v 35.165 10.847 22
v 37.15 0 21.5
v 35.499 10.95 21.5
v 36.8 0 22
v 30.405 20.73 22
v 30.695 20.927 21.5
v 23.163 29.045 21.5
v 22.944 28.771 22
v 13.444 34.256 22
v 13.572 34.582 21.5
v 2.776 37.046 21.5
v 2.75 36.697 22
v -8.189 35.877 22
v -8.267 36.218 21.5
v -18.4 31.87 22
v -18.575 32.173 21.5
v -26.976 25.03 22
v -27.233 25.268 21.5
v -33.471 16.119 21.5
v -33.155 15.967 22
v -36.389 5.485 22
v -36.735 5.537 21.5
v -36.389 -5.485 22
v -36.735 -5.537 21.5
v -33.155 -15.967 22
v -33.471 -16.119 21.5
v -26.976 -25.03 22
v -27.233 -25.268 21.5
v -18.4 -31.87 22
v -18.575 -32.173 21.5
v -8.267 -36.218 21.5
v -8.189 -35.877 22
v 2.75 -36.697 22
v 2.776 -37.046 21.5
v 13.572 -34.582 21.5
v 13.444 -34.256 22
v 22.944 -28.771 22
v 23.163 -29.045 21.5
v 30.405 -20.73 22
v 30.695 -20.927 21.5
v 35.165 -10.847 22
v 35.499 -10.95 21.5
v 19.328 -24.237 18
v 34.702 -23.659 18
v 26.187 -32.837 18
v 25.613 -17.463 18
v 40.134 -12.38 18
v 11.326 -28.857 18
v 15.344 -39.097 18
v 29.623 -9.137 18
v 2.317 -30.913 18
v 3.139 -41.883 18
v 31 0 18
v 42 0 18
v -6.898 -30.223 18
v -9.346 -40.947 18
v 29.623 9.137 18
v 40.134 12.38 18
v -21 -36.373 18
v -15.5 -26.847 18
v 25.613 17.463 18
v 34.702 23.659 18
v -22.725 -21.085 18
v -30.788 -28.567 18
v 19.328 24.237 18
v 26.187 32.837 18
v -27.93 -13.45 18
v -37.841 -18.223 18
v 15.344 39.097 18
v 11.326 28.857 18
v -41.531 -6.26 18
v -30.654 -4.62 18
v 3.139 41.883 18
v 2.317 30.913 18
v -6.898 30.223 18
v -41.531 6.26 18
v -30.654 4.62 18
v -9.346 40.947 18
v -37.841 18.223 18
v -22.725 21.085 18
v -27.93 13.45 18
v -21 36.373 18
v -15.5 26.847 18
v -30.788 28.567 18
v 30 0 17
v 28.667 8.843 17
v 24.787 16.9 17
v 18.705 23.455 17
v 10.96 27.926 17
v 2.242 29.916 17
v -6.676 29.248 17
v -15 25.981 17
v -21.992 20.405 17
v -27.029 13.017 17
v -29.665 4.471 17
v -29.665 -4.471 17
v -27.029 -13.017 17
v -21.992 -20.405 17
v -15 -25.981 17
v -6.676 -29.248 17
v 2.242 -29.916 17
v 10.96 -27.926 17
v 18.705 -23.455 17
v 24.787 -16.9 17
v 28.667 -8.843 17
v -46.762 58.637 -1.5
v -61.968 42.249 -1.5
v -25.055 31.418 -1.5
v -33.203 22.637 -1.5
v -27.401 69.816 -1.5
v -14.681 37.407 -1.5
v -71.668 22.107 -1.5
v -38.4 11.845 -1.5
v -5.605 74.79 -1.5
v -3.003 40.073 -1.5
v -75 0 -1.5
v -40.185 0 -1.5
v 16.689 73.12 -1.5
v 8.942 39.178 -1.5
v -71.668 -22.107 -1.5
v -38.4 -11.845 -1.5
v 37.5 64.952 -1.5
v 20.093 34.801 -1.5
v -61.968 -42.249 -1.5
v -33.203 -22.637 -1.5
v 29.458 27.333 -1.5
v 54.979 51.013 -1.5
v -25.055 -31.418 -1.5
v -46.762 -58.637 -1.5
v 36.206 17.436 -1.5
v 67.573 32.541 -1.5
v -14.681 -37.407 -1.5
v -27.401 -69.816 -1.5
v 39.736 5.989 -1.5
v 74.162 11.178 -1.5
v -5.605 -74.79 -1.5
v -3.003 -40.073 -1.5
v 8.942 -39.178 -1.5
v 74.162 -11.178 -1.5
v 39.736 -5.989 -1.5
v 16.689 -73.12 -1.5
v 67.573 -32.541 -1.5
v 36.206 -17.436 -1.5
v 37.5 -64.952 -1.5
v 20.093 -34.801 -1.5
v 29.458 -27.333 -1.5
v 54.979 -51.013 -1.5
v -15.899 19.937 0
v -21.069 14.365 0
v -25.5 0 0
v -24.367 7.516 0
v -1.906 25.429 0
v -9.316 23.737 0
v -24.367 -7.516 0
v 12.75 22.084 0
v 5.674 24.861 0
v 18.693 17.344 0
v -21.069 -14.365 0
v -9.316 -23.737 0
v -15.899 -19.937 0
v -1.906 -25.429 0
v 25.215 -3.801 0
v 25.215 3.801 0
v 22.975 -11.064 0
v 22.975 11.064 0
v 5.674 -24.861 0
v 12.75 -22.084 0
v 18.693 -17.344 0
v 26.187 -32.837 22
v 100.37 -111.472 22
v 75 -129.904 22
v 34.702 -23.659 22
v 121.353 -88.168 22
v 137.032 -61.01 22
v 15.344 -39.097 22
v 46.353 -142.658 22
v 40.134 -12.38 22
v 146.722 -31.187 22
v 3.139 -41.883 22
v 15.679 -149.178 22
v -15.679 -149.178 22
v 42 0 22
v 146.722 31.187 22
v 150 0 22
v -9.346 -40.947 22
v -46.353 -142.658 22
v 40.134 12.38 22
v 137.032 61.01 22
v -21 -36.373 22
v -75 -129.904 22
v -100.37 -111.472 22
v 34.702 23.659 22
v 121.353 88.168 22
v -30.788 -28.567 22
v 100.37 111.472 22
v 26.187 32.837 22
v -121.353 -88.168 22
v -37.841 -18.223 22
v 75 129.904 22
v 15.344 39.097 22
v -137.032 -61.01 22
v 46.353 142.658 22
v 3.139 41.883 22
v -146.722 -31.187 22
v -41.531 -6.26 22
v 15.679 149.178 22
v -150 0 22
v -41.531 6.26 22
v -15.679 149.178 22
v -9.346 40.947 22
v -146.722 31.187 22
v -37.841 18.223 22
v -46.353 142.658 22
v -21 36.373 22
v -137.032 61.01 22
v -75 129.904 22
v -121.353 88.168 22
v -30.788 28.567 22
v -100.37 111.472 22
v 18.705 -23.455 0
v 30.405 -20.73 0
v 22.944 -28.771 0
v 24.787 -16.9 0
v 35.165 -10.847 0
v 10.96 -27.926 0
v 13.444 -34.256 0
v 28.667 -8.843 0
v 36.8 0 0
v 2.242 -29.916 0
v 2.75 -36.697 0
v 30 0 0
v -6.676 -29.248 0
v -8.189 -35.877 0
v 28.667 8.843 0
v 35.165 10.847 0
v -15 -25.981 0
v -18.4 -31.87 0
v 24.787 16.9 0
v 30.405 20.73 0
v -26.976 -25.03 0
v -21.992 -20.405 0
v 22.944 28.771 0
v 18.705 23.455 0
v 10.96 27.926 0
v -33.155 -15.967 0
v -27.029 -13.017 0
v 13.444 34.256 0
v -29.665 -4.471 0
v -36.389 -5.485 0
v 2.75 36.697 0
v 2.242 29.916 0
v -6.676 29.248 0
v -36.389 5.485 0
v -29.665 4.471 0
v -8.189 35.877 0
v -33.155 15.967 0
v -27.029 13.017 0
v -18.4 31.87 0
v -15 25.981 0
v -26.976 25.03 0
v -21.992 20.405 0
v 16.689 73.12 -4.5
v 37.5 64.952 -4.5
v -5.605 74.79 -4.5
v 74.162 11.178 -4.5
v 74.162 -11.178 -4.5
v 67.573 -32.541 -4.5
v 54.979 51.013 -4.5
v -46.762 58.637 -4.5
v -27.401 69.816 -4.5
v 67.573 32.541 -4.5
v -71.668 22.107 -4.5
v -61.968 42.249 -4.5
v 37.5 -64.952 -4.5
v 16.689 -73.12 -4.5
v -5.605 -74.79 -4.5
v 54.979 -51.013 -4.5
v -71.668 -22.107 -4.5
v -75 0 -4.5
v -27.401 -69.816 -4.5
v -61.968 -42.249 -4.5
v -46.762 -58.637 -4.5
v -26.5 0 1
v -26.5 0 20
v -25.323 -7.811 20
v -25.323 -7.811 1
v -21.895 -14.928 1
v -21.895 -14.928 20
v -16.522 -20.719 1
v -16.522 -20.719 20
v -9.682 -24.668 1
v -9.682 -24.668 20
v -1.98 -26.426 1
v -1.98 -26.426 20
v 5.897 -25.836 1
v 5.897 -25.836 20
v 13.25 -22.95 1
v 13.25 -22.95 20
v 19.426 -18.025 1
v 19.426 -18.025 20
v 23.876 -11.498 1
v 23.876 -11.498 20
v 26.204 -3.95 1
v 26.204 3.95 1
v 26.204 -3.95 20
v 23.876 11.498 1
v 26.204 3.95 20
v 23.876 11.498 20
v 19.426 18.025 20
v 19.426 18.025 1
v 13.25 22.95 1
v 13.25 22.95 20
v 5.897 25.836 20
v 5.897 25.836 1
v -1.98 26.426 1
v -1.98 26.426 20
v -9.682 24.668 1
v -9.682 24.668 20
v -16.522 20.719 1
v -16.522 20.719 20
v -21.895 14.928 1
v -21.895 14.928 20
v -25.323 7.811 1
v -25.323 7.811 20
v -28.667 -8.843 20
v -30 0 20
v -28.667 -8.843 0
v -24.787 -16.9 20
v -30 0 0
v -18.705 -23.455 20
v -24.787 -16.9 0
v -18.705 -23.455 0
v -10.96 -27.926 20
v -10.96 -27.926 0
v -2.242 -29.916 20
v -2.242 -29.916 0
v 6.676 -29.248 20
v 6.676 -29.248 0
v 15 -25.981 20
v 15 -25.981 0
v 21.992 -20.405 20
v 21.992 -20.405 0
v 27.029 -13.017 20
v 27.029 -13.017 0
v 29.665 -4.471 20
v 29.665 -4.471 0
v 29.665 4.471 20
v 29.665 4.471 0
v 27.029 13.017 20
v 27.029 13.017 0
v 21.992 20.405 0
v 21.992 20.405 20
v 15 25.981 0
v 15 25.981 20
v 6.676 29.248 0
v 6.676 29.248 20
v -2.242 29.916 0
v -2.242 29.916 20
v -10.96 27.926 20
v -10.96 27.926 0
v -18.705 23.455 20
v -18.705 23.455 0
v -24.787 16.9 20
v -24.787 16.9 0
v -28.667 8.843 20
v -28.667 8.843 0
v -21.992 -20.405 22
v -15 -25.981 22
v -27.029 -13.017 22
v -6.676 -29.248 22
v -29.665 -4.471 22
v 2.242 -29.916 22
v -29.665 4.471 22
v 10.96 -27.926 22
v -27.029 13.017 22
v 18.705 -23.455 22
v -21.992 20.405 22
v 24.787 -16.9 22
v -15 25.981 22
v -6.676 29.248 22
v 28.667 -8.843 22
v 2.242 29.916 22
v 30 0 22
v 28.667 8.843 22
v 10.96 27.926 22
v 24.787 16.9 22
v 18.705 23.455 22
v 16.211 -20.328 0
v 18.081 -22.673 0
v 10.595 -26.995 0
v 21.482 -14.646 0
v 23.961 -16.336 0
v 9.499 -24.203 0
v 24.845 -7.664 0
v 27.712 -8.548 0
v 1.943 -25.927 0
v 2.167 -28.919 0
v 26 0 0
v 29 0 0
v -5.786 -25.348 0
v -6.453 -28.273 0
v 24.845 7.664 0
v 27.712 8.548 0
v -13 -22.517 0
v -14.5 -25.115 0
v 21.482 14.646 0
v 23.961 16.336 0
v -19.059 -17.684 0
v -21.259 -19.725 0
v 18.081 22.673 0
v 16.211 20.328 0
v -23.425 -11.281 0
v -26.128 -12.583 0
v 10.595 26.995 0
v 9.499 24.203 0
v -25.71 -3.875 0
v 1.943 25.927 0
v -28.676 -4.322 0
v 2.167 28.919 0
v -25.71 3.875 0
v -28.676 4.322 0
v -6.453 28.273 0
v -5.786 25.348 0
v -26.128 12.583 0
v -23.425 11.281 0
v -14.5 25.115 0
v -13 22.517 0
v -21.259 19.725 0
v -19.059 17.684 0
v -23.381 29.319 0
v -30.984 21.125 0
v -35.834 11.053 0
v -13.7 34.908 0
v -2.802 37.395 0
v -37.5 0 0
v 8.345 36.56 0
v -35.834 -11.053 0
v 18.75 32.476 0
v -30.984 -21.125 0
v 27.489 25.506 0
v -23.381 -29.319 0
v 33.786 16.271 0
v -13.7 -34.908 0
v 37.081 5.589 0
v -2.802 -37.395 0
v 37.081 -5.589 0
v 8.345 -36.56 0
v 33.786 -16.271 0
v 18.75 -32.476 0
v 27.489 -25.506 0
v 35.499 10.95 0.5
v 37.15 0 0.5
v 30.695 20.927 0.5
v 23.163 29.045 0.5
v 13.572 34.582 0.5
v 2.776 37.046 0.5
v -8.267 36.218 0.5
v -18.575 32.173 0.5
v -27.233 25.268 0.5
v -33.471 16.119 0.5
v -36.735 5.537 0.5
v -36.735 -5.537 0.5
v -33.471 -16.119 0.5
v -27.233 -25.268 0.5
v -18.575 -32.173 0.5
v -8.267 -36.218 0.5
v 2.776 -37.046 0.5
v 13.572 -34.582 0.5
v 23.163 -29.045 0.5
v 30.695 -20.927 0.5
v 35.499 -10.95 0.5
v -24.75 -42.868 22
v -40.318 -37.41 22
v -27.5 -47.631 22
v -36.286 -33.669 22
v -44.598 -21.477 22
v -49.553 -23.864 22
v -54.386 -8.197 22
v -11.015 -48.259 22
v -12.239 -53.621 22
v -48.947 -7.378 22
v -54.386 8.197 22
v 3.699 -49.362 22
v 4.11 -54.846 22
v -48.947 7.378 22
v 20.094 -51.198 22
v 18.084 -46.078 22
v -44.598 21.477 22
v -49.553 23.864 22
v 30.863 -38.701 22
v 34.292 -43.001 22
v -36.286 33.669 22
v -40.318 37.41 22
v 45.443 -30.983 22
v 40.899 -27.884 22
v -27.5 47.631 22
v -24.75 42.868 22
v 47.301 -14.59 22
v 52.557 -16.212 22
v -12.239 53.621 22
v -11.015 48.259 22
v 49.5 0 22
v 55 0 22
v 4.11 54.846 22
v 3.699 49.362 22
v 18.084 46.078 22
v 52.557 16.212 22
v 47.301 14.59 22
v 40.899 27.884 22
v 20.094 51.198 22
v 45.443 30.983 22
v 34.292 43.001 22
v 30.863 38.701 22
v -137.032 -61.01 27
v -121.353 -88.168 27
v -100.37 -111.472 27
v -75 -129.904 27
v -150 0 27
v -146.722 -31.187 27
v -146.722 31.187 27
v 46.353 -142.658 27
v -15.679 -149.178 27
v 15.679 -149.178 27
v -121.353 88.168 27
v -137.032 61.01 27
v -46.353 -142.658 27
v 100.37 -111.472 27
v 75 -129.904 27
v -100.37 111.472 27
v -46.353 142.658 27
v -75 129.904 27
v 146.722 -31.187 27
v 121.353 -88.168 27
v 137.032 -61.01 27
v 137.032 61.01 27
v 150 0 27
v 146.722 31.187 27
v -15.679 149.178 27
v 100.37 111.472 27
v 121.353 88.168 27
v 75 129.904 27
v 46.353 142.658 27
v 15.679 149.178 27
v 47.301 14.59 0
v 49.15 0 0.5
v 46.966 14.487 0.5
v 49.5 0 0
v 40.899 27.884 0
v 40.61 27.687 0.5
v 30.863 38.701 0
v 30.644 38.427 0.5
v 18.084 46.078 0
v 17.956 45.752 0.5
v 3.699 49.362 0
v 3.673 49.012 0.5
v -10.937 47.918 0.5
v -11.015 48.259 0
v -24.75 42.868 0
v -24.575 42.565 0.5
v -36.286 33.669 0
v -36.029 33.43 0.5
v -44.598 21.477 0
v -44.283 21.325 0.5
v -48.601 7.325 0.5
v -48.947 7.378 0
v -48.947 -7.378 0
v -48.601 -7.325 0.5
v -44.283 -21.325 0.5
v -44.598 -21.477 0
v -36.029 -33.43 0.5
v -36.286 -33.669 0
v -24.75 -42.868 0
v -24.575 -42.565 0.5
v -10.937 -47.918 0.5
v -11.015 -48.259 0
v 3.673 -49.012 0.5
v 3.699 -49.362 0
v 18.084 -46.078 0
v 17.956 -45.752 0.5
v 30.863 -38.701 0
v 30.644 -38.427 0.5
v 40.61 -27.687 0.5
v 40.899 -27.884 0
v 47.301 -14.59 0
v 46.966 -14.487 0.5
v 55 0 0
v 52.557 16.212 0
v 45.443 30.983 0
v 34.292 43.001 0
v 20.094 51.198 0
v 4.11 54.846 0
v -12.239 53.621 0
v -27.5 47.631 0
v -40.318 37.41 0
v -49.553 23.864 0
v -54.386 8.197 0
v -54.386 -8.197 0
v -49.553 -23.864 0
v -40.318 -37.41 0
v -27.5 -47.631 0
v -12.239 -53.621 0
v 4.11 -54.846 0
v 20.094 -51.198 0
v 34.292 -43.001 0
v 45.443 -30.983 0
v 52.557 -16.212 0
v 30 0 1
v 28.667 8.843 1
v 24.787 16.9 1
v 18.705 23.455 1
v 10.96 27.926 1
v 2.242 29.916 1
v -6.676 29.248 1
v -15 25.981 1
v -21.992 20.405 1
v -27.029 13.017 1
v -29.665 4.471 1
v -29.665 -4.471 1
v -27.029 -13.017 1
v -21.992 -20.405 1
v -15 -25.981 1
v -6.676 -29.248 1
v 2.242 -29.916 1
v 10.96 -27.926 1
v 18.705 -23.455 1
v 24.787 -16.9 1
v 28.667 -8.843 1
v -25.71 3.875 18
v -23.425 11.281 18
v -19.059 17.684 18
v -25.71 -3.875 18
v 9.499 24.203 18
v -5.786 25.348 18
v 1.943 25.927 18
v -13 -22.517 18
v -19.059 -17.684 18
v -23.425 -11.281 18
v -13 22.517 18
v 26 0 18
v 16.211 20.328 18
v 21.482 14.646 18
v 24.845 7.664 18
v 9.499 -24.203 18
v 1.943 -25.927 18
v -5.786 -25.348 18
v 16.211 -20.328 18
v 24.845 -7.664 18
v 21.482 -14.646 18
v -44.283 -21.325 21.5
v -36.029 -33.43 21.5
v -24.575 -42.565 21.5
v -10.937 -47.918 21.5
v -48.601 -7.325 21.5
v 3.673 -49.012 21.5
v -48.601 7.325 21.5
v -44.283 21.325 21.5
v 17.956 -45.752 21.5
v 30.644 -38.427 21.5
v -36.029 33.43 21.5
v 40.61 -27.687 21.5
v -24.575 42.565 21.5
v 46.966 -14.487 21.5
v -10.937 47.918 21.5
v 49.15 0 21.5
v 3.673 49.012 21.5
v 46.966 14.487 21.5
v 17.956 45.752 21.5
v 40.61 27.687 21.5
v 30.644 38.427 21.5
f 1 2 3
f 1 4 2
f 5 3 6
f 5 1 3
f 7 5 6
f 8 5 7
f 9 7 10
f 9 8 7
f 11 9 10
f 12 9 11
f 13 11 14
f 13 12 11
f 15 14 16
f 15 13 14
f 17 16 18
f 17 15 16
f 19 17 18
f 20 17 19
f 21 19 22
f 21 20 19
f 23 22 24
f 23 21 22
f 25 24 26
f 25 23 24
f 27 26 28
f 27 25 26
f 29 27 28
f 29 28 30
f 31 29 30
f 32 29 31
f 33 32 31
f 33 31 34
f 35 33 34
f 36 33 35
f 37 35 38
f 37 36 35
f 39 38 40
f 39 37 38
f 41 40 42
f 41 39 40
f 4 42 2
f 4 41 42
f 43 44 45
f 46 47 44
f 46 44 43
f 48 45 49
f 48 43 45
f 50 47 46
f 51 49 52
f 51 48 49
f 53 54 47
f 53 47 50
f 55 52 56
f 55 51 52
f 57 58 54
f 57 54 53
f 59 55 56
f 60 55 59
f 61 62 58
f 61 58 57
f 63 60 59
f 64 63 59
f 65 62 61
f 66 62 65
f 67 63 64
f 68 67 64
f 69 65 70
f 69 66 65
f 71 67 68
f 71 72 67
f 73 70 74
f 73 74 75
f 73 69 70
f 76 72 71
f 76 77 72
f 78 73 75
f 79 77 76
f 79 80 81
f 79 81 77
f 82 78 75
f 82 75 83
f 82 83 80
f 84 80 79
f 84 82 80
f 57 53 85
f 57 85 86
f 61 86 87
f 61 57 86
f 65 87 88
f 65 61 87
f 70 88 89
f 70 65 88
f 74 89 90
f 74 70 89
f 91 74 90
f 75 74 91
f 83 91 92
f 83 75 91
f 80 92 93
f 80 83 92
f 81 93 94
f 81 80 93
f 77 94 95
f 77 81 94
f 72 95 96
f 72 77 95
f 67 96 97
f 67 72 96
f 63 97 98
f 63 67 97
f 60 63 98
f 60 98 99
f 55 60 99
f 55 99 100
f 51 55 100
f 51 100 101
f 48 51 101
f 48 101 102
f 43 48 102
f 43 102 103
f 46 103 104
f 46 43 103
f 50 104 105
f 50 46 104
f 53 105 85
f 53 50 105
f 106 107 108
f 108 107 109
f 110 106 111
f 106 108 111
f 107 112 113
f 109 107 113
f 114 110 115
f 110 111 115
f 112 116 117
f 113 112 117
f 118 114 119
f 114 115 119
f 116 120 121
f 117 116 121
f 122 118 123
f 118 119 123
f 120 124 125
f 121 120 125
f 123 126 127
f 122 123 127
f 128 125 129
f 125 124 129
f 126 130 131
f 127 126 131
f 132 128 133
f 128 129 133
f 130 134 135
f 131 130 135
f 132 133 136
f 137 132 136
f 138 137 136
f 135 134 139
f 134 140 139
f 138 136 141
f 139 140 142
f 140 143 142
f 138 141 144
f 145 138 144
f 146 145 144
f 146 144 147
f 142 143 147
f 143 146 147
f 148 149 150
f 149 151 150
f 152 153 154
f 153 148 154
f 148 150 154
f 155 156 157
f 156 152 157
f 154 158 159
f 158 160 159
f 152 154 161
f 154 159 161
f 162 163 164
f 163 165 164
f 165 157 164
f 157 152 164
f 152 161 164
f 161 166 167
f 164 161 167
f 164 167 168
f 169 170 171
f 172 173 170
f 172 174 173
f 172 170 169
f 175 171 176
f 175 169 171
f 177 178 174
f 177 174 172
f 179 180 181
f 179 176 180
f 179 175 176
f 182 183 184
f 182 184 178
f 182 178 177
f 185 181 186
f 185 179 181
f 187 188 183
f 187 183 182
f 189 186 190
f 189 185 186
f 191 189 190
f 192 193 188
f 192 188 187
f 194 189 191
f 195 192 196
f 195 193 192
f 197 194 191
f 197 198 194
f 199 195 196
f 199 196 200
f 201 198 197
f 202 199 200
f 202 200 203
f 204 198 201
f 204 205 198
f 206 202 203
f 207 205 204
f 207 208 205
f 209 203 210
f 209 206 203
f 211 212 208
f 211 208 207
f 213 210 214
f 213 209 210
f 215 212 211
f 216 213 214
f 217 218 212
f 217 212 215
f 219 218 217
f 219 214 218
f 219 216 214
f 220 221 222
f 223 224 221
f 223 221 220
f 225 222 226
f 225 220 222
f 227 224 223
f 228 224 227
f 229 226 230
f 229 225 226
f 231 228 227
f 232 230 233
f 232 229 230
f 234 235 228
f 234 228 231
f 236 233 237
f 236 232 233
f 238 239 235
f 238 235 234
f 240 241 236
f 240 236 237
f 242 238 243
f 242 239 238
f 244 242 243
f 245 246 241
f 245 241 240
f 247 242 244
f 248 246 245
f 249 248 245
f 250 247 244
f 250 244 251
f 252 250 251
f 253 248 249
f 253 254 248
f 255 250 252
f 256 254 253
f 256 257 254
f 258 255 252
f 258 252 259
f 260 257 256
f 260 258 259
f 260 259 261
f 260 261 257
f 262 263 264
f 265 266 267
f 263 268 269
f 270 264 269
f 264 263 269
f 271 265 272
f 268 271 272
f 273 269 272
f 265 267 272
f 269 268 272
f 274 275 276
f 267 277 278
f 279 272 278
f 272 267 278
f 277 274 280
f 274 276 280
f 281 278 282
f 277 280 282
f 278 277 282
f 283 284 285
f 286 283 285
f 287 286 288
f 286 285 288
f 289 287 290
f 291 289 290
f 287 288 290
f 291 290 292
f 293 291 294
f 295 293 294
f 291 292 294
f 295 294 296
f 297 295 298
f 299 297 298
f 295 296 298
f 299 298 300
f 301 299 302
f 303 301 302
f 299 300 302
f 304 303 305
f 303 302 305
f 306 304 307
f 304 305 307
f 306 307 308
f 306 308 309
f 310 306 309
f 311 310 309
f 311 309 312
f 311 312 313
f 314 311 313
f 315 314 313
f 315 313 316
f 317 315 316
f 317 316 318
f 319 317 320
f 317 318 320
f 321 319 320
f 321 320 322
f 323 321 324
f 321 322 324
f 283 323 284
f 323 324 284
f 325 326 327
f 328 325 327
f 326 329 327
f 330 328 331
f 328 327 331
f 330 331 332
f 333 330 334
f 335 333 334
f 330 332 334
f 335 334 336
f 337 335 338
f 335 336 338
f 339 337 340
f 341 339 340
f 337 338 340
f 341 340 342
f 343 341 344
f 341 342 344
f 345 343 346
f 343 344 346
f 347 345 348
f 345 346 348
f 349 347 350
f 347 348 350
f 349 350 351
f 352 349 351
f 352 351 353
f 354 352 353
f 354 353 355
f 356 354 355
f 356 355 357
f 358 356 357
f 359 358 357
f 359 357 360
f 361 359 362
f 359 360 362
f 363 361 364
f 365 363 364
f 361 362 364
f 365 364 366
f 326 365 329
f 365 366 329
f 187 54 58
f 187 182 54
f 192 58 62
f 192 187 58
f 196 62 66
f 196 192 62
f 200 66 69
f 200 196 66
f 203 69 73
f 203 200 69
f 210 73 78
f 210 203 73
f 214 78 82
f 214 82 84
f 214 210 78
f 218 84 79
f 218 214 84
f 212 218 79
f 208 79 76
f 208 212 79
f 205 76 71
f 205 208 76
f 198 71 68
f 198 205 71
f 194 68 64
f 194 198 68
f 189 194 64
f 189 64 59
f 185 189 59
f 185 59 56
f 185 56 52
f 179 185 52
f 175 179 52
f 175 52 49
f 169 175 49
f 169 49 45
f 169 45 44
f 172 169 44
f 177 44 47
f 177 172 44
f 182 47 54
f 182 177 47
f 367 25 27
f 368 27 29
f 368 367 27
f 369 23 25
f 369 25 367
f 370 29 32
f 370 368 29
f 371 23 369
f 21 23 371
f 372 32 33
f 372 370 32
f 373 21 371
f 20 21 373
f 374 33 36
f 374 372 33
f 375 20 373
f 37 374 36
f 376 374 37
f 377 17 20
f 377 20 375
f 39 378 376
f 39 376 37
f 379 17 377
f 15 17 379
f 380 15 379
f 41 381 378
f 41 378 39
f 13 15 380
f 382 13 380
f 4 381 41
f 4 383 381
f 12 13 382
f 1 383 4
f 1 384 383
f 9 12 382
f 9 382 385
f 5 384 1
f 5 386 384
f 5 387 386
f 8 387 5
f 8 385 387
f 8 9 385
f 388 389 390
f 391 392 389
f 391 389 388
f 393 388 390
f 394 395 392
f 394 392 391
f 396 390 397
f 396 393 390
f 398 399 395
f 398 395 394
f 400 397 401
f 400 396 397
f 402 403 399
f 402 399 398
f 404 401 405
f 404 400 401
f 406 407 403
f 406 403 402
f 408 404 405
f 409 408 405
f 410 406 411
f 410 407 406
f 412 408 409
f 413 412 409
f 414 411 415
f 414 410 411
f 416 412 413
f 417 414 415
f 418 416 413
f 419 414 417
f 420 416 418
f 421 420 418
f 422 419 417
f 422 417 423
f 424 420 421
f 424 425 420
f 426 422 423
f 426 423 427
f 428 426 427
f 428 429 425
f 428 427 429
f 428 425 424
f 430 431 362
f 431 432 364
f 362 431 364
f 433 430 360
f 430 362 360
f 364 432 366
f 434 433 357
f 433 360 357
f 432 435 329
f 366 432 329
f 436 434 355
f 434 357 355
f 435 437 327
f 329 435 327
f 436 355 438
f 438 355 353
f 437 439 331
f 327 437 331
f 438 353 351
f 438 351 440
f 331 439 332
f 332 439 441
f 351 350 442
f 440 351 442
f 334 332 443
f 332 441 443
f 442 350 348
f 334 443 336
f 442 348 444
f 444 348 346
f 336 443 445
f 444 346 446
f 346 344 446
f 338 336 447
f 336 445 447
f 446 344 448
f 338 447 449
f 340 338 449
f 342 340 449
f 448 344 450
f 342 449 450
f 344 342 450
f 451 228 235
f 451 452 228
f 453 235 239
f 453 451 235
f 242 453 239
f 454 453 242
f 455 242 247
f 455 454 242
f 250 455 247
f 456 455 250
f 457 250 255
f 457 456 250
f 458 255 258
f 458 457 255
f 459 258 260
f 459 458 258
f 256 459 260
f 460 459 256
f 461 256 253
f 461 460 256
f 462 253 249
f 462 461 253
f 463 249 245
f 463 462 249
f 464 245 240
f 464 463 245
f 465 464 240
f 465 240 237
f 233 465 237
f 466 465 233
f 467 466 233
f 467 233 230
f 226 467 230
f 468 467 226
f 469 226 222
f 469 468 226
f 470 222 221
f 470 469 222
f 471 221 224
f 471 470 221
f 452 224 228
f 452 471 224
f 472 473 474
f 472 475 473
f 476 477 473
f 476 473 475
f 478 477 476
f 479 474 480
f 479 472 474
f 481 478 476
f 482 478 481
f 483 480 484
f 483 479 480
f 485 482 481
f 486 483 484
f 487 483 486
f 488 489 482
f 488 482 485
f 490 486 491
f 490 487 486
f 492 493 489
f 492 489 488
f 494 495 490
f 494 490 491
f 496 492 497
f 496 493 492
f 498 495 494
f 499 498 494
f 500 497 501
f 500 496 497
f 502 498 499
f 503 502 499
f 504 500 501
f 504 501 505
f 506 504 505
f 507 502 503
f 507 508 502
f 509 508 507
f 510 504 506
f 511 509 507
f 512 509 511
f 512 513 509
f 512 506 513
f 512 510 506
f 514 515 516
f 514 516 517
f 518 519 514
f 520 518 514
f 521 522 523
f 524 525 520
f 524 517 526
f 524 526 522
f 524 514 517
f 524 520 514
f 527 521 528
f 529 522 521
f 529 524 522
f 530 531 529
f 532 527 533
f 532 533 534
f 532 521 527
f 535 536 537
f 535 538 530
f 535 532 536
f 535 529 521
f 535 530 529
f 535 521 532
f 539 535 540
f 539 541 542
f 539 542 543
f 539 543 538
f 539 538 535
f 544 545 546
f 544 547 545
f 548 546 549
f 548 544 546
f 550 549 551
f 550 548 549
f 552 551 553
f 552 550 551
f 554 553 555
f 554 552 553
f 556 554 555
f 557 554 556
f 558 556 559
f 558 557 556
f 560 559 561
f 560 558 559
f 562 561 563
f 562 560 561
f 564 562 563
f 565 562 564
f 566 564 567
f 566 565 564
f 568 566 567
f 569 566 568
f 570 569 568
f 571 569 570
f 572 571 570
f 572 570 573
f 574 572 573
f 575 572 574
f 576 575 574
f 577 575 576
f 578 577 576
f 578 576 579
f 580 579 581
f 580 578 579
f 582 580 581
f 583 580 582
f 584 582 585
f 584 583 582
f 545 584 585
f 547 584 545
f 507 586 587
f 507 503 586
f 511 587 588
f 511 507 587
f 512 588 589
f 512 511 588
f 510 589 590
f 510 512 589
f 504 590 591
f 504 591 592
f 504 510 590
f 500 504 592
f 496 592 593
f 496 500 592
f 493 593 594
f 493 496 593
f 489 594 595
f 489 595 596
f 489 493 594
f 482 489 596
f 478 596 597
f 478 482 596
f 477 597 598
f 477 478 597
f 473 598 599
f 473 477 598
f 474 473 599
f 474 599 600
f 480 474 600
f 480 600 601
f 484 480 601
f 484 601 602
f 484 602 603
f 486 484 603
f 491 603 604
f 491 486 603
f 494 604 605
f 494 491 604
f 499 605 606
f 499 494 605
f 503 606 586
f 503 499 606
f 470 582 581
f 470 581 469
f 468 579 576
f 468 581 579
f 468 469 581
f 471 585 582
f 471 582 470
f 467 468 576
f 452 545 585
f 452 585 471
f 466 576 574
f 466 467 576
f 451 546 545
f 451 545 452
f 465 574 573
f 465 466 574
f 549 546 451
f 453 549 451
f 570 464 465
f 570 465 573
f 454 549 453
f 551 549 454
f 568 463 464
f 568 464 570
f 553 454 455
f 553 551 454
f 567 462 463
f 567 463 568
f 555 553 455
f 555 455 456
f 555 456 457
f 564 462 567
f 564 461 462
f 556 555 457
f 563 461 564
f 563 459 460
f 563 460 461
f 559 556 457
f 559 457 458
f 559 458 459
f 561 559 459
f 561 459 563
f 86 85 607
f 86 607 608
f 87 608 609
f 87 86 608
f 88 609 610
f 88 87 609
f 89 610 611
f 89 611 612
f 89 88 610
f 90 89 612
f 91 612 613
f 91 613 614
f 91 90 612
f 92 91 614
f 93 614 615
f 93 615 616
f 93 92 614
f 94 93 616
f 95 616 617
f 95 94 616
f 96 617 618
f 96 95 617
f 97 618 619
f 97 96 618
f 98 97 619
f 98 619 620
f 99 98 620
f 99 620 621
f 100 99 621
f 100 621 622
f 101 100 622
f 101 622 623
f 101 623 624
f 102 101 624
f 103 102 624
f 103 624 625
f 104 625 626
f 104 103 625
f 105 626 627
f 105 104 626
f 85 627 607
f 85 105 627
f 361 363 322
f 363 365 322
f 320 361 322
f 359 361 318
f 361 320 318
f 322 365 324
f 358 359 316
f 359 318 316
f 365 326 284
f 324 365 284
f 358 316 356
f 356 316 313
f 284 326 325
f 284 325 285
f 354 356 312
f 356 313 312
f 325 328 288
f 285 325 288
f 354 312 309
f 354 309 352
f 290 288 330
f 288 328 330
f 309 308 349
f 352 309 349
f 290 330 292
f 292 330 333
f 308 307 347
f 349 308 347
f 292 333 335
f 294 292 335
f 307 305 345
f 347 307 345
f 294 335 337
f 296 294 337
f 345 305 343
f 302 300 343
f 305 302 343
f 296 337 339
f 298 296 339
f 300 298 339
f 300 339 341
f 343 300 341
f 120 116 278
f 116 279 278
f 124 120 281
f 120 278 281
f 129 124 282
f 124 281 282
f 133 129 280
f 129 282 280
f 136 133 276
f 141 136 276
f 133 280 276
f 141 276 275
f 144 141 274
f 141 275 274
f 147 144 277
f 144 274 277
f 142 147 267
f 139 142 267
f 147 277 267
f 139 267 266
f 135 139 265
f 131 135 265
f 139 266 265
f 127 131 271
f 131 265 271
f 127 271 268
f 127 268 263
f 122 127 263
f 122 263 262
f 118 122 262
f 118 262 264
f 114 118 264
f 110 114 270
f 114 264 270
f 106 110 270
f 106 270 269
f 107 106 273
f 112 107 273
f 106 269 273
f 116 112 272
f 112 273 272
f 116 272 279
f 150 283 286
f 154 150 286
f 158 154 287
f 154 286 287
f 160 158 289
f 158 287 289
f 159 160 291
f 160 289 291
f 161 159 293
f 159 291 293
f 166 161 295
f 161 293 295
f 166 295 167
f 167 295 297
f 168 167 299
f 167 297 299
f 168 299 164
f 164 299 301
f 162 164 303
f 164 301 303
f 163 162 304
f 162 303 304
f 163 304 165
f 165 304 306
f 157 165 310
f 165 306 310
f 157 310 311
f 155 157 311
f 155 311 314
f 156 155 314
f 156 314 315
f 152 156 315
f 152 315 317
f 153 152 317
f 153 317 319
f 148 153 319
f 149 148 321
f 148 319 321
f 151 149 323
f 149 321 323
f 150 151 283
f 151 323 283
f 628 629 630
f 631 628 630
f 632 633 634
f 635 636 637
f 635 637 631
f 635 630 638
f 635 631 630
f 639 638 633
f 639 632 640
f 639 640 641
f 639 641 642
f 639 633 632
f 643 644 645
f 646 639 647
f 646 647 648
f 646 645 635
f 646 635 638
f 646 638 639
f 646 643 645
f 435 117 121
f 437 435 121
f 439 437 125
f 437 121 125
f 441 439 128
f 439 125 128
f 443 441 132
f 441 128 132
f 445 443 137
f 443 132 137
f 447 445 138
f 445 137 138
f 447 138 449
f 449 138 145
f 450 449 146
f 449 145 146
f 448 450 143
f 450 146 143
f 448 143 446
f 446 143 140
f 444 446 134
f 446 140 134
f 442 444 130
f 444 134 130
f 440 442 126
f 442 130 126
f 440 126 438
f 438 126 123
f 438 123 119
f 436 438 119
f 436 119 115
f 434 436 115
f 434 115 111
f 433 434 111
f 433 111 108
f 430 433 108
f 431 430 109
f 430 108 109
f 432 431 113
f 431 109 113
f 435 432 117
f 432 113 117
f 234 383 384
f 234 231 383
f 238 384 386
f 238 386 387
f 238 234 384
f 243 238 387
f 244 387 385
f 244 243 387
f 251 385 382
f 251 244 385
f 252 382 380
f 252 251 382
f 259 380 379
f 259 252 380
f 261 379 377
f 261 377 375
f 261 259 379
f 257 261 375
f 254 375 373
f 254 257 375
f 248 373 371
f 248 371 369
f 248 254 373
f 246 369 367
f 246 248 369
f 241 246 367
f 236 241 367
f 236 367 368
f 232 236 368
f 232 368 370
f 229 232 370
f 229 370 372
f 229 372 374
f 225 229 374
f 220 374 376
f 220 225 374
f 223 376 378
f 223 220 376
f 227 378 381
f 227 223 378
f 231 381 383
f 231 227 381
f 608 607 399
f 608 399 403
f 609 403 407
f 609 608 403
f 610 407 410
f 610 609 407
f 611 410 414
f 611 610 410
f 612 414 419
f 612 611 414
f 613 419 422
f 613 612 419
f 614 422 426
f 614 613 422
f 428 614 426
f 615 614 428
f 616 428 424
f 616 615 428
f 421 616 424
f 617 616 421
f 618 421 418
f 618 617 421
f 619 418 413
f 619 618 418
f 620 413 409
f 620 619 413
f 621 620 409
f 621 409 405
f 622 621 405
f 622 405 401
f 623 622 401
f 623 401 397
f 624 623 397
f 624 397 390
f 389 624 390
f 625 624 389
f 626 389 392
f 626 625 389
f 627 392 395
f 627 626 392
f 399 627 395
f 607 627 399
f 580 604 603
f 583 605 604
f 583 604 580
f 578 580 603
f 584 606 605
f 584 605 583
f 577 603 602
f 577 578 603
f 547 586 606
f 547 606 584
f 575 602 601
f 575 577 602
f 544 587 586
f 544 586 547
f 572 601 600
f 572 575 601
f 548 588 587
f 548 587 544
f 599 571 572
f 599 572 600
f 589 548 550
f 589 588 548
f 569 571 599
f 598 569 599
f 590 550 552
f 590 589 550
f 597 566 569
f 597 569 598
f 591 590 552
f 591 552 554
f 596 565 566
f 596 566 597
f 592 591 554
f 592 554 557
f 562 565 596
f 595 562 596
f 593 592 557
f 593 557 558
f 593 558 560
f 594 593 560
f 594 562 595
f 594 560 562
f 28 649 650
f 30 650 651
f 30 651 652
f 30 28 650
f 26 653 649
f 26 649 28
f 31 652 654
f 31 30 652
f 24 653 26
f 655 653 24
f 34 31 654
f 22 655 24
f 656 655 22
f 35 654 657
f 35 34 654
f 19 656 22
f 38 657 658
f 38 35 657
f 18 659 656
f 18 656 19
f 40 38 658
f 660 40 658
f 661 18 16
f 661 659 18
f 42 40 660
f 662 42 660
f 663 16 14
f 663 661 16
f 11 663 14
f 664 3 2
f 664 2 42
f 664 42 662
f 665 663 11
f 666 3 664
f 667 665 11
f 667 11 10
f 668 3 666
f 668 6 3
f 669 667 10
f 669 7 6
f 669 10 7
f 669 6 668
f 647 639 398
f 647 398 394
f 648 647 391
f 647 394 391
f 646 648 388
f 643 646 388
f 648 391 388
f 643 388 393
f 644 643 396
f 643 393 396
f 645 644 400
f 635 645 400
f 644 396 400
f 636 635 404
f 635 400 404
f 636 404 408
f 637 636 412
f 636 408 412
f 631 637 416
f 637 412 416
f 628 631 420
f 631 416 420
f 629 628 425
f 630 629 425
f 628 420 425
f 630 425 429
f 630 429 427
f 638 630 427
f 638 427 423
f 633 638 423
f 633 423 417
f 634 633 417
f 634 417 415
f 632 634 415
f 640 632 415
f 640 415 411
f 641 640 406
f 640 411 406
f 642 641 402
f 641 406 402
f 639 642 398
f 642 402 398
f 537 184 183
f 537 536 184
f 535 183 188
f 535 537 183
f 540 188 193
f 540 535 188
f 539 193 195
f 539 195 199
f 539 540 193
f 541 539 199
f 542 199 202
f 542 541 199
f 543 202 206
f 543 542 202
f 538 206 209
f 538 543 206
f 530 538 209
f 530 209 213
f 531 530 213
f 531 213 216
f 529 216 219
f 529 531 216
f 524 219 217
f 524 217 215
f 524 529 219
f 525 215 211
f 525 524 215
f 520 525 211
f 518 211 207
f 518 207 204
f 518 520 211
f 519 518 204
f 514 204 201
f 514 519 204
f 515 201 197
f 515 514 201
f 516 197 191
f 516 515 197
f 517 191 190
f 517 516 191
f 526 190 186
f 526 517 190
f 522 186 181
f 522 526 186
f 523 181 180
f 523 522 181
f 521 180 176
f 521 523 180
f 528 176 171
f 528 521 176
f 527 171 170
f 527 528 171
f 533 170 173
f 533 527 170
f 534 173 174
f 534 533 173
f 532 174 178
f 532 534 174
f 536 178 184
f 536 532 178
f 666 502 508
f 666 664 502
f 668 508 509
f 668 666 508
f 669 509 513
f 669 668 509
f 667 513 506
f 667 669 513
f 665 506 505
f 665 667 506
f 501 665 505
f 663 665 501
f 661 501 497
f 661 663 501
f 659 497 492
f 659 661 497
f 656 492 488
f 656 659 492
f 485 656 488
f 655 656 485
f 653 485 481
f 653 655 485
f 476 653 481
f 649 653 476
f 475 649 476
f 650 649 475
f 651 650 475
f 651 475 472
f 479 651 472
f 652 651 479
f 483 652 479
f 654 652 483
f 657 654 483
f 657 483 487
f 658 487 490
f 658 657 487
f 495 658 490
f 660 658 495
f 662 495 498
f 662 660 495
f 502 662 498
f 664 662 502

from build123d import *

# Parameters (mm, degrees)
SKETCH007_R     = 26
POCKET_DEPTH    = 18
CHAMFER_SIZE    = 1
CHAMFER001_SIZE = 1


with BuildPart() as body:
    # Sketch006 (on XZ_Plane of Origin) → Revolution001 (revolve)
    with BuildSketch(Plane.XZ):
        Polygon((0, 0), (30, 0), (30, 18), (42, 18), (42, 22), (150, 22), (150, 27), (0, 27), align=None)
    revolve(axis=Axis((0, 0, 0), (0, 0, 1)))

    # Sketch007 (on Face1 of Revolution001) → Pocket (cut)
    with BuildSketch(Plane(origin=(0, 0, 0), x_dir=(1, 0, 0), z_dir=(0, 0, -1))):
        Circle(SKETCH007_R)
    extrude(amount=-POCKET_DEPTH, mode=Mode.SUBTRACT)

    # Chamfer
    chamfer_edges = [body.edges().sort_by_distance(p)[0] for p in [
        (-30, 0, 0),
        (-30, 0, 18),
    ]]
    chamfer(chamfer_edges, length=CHAMFER_SIZE)


with BuildPart() as body001:
    # Sketch (on XZ_Plane of Origin002) → Revolution (revolve)
    with BuildSketch(Plane.XZ):
        Polygon((30, 22), (30, 0), (36.799792, 0), (37.149896, 0.5), (49.149896, 0.5), (49.5, 0), (55, 0), (55, 22), (49.5, 22), (49.149896, 21.5), (37.149896, 21.5), (36.799792, 22), align=None)
    revolve(axis=Axis((0, 0, 0), (0, 0, 1)))


with BuildPart() as body002:
    # Sketch008 (on XZ_Plane002 of Origin004) → Revolution002 (revolve)
    with BuildSketch(Plane.XZ):
        Polygon((0, 0), (-26.5, 0), (-26.5, 20), (-30, 20), (-30, 0), (-37.5, 0), (-37.5, -3), (0, -3), align=None)
    revolve(axis=Axis((0, 0, 0), (0, 0, 1)))

    # Chamfer001
    chamfer001_edges = [body002.edges().sort_by_distance(p)[0] for p in [
        (26.5, 0, 0),
    ]]
    chamfer(chamfer001_edges, length=CHAMFER001_SIZE)

    # Sketch009 (on XZ_Plane002 of Origin004) → Revolution003 (revolve)
    with BuildSketch(Plane.XZ):
        Polygon((-37.5, 0), (-40.1853, -1.5), (-75, -1.5), (-75, -4.5), (0, -4.5), (0, -3), (-37.5, -3), align=None)
    revolve(axis=Axis((0, 0, 0), (0, 0, 1)))


solid = Compound([body.part, body001.part, body002.part])
